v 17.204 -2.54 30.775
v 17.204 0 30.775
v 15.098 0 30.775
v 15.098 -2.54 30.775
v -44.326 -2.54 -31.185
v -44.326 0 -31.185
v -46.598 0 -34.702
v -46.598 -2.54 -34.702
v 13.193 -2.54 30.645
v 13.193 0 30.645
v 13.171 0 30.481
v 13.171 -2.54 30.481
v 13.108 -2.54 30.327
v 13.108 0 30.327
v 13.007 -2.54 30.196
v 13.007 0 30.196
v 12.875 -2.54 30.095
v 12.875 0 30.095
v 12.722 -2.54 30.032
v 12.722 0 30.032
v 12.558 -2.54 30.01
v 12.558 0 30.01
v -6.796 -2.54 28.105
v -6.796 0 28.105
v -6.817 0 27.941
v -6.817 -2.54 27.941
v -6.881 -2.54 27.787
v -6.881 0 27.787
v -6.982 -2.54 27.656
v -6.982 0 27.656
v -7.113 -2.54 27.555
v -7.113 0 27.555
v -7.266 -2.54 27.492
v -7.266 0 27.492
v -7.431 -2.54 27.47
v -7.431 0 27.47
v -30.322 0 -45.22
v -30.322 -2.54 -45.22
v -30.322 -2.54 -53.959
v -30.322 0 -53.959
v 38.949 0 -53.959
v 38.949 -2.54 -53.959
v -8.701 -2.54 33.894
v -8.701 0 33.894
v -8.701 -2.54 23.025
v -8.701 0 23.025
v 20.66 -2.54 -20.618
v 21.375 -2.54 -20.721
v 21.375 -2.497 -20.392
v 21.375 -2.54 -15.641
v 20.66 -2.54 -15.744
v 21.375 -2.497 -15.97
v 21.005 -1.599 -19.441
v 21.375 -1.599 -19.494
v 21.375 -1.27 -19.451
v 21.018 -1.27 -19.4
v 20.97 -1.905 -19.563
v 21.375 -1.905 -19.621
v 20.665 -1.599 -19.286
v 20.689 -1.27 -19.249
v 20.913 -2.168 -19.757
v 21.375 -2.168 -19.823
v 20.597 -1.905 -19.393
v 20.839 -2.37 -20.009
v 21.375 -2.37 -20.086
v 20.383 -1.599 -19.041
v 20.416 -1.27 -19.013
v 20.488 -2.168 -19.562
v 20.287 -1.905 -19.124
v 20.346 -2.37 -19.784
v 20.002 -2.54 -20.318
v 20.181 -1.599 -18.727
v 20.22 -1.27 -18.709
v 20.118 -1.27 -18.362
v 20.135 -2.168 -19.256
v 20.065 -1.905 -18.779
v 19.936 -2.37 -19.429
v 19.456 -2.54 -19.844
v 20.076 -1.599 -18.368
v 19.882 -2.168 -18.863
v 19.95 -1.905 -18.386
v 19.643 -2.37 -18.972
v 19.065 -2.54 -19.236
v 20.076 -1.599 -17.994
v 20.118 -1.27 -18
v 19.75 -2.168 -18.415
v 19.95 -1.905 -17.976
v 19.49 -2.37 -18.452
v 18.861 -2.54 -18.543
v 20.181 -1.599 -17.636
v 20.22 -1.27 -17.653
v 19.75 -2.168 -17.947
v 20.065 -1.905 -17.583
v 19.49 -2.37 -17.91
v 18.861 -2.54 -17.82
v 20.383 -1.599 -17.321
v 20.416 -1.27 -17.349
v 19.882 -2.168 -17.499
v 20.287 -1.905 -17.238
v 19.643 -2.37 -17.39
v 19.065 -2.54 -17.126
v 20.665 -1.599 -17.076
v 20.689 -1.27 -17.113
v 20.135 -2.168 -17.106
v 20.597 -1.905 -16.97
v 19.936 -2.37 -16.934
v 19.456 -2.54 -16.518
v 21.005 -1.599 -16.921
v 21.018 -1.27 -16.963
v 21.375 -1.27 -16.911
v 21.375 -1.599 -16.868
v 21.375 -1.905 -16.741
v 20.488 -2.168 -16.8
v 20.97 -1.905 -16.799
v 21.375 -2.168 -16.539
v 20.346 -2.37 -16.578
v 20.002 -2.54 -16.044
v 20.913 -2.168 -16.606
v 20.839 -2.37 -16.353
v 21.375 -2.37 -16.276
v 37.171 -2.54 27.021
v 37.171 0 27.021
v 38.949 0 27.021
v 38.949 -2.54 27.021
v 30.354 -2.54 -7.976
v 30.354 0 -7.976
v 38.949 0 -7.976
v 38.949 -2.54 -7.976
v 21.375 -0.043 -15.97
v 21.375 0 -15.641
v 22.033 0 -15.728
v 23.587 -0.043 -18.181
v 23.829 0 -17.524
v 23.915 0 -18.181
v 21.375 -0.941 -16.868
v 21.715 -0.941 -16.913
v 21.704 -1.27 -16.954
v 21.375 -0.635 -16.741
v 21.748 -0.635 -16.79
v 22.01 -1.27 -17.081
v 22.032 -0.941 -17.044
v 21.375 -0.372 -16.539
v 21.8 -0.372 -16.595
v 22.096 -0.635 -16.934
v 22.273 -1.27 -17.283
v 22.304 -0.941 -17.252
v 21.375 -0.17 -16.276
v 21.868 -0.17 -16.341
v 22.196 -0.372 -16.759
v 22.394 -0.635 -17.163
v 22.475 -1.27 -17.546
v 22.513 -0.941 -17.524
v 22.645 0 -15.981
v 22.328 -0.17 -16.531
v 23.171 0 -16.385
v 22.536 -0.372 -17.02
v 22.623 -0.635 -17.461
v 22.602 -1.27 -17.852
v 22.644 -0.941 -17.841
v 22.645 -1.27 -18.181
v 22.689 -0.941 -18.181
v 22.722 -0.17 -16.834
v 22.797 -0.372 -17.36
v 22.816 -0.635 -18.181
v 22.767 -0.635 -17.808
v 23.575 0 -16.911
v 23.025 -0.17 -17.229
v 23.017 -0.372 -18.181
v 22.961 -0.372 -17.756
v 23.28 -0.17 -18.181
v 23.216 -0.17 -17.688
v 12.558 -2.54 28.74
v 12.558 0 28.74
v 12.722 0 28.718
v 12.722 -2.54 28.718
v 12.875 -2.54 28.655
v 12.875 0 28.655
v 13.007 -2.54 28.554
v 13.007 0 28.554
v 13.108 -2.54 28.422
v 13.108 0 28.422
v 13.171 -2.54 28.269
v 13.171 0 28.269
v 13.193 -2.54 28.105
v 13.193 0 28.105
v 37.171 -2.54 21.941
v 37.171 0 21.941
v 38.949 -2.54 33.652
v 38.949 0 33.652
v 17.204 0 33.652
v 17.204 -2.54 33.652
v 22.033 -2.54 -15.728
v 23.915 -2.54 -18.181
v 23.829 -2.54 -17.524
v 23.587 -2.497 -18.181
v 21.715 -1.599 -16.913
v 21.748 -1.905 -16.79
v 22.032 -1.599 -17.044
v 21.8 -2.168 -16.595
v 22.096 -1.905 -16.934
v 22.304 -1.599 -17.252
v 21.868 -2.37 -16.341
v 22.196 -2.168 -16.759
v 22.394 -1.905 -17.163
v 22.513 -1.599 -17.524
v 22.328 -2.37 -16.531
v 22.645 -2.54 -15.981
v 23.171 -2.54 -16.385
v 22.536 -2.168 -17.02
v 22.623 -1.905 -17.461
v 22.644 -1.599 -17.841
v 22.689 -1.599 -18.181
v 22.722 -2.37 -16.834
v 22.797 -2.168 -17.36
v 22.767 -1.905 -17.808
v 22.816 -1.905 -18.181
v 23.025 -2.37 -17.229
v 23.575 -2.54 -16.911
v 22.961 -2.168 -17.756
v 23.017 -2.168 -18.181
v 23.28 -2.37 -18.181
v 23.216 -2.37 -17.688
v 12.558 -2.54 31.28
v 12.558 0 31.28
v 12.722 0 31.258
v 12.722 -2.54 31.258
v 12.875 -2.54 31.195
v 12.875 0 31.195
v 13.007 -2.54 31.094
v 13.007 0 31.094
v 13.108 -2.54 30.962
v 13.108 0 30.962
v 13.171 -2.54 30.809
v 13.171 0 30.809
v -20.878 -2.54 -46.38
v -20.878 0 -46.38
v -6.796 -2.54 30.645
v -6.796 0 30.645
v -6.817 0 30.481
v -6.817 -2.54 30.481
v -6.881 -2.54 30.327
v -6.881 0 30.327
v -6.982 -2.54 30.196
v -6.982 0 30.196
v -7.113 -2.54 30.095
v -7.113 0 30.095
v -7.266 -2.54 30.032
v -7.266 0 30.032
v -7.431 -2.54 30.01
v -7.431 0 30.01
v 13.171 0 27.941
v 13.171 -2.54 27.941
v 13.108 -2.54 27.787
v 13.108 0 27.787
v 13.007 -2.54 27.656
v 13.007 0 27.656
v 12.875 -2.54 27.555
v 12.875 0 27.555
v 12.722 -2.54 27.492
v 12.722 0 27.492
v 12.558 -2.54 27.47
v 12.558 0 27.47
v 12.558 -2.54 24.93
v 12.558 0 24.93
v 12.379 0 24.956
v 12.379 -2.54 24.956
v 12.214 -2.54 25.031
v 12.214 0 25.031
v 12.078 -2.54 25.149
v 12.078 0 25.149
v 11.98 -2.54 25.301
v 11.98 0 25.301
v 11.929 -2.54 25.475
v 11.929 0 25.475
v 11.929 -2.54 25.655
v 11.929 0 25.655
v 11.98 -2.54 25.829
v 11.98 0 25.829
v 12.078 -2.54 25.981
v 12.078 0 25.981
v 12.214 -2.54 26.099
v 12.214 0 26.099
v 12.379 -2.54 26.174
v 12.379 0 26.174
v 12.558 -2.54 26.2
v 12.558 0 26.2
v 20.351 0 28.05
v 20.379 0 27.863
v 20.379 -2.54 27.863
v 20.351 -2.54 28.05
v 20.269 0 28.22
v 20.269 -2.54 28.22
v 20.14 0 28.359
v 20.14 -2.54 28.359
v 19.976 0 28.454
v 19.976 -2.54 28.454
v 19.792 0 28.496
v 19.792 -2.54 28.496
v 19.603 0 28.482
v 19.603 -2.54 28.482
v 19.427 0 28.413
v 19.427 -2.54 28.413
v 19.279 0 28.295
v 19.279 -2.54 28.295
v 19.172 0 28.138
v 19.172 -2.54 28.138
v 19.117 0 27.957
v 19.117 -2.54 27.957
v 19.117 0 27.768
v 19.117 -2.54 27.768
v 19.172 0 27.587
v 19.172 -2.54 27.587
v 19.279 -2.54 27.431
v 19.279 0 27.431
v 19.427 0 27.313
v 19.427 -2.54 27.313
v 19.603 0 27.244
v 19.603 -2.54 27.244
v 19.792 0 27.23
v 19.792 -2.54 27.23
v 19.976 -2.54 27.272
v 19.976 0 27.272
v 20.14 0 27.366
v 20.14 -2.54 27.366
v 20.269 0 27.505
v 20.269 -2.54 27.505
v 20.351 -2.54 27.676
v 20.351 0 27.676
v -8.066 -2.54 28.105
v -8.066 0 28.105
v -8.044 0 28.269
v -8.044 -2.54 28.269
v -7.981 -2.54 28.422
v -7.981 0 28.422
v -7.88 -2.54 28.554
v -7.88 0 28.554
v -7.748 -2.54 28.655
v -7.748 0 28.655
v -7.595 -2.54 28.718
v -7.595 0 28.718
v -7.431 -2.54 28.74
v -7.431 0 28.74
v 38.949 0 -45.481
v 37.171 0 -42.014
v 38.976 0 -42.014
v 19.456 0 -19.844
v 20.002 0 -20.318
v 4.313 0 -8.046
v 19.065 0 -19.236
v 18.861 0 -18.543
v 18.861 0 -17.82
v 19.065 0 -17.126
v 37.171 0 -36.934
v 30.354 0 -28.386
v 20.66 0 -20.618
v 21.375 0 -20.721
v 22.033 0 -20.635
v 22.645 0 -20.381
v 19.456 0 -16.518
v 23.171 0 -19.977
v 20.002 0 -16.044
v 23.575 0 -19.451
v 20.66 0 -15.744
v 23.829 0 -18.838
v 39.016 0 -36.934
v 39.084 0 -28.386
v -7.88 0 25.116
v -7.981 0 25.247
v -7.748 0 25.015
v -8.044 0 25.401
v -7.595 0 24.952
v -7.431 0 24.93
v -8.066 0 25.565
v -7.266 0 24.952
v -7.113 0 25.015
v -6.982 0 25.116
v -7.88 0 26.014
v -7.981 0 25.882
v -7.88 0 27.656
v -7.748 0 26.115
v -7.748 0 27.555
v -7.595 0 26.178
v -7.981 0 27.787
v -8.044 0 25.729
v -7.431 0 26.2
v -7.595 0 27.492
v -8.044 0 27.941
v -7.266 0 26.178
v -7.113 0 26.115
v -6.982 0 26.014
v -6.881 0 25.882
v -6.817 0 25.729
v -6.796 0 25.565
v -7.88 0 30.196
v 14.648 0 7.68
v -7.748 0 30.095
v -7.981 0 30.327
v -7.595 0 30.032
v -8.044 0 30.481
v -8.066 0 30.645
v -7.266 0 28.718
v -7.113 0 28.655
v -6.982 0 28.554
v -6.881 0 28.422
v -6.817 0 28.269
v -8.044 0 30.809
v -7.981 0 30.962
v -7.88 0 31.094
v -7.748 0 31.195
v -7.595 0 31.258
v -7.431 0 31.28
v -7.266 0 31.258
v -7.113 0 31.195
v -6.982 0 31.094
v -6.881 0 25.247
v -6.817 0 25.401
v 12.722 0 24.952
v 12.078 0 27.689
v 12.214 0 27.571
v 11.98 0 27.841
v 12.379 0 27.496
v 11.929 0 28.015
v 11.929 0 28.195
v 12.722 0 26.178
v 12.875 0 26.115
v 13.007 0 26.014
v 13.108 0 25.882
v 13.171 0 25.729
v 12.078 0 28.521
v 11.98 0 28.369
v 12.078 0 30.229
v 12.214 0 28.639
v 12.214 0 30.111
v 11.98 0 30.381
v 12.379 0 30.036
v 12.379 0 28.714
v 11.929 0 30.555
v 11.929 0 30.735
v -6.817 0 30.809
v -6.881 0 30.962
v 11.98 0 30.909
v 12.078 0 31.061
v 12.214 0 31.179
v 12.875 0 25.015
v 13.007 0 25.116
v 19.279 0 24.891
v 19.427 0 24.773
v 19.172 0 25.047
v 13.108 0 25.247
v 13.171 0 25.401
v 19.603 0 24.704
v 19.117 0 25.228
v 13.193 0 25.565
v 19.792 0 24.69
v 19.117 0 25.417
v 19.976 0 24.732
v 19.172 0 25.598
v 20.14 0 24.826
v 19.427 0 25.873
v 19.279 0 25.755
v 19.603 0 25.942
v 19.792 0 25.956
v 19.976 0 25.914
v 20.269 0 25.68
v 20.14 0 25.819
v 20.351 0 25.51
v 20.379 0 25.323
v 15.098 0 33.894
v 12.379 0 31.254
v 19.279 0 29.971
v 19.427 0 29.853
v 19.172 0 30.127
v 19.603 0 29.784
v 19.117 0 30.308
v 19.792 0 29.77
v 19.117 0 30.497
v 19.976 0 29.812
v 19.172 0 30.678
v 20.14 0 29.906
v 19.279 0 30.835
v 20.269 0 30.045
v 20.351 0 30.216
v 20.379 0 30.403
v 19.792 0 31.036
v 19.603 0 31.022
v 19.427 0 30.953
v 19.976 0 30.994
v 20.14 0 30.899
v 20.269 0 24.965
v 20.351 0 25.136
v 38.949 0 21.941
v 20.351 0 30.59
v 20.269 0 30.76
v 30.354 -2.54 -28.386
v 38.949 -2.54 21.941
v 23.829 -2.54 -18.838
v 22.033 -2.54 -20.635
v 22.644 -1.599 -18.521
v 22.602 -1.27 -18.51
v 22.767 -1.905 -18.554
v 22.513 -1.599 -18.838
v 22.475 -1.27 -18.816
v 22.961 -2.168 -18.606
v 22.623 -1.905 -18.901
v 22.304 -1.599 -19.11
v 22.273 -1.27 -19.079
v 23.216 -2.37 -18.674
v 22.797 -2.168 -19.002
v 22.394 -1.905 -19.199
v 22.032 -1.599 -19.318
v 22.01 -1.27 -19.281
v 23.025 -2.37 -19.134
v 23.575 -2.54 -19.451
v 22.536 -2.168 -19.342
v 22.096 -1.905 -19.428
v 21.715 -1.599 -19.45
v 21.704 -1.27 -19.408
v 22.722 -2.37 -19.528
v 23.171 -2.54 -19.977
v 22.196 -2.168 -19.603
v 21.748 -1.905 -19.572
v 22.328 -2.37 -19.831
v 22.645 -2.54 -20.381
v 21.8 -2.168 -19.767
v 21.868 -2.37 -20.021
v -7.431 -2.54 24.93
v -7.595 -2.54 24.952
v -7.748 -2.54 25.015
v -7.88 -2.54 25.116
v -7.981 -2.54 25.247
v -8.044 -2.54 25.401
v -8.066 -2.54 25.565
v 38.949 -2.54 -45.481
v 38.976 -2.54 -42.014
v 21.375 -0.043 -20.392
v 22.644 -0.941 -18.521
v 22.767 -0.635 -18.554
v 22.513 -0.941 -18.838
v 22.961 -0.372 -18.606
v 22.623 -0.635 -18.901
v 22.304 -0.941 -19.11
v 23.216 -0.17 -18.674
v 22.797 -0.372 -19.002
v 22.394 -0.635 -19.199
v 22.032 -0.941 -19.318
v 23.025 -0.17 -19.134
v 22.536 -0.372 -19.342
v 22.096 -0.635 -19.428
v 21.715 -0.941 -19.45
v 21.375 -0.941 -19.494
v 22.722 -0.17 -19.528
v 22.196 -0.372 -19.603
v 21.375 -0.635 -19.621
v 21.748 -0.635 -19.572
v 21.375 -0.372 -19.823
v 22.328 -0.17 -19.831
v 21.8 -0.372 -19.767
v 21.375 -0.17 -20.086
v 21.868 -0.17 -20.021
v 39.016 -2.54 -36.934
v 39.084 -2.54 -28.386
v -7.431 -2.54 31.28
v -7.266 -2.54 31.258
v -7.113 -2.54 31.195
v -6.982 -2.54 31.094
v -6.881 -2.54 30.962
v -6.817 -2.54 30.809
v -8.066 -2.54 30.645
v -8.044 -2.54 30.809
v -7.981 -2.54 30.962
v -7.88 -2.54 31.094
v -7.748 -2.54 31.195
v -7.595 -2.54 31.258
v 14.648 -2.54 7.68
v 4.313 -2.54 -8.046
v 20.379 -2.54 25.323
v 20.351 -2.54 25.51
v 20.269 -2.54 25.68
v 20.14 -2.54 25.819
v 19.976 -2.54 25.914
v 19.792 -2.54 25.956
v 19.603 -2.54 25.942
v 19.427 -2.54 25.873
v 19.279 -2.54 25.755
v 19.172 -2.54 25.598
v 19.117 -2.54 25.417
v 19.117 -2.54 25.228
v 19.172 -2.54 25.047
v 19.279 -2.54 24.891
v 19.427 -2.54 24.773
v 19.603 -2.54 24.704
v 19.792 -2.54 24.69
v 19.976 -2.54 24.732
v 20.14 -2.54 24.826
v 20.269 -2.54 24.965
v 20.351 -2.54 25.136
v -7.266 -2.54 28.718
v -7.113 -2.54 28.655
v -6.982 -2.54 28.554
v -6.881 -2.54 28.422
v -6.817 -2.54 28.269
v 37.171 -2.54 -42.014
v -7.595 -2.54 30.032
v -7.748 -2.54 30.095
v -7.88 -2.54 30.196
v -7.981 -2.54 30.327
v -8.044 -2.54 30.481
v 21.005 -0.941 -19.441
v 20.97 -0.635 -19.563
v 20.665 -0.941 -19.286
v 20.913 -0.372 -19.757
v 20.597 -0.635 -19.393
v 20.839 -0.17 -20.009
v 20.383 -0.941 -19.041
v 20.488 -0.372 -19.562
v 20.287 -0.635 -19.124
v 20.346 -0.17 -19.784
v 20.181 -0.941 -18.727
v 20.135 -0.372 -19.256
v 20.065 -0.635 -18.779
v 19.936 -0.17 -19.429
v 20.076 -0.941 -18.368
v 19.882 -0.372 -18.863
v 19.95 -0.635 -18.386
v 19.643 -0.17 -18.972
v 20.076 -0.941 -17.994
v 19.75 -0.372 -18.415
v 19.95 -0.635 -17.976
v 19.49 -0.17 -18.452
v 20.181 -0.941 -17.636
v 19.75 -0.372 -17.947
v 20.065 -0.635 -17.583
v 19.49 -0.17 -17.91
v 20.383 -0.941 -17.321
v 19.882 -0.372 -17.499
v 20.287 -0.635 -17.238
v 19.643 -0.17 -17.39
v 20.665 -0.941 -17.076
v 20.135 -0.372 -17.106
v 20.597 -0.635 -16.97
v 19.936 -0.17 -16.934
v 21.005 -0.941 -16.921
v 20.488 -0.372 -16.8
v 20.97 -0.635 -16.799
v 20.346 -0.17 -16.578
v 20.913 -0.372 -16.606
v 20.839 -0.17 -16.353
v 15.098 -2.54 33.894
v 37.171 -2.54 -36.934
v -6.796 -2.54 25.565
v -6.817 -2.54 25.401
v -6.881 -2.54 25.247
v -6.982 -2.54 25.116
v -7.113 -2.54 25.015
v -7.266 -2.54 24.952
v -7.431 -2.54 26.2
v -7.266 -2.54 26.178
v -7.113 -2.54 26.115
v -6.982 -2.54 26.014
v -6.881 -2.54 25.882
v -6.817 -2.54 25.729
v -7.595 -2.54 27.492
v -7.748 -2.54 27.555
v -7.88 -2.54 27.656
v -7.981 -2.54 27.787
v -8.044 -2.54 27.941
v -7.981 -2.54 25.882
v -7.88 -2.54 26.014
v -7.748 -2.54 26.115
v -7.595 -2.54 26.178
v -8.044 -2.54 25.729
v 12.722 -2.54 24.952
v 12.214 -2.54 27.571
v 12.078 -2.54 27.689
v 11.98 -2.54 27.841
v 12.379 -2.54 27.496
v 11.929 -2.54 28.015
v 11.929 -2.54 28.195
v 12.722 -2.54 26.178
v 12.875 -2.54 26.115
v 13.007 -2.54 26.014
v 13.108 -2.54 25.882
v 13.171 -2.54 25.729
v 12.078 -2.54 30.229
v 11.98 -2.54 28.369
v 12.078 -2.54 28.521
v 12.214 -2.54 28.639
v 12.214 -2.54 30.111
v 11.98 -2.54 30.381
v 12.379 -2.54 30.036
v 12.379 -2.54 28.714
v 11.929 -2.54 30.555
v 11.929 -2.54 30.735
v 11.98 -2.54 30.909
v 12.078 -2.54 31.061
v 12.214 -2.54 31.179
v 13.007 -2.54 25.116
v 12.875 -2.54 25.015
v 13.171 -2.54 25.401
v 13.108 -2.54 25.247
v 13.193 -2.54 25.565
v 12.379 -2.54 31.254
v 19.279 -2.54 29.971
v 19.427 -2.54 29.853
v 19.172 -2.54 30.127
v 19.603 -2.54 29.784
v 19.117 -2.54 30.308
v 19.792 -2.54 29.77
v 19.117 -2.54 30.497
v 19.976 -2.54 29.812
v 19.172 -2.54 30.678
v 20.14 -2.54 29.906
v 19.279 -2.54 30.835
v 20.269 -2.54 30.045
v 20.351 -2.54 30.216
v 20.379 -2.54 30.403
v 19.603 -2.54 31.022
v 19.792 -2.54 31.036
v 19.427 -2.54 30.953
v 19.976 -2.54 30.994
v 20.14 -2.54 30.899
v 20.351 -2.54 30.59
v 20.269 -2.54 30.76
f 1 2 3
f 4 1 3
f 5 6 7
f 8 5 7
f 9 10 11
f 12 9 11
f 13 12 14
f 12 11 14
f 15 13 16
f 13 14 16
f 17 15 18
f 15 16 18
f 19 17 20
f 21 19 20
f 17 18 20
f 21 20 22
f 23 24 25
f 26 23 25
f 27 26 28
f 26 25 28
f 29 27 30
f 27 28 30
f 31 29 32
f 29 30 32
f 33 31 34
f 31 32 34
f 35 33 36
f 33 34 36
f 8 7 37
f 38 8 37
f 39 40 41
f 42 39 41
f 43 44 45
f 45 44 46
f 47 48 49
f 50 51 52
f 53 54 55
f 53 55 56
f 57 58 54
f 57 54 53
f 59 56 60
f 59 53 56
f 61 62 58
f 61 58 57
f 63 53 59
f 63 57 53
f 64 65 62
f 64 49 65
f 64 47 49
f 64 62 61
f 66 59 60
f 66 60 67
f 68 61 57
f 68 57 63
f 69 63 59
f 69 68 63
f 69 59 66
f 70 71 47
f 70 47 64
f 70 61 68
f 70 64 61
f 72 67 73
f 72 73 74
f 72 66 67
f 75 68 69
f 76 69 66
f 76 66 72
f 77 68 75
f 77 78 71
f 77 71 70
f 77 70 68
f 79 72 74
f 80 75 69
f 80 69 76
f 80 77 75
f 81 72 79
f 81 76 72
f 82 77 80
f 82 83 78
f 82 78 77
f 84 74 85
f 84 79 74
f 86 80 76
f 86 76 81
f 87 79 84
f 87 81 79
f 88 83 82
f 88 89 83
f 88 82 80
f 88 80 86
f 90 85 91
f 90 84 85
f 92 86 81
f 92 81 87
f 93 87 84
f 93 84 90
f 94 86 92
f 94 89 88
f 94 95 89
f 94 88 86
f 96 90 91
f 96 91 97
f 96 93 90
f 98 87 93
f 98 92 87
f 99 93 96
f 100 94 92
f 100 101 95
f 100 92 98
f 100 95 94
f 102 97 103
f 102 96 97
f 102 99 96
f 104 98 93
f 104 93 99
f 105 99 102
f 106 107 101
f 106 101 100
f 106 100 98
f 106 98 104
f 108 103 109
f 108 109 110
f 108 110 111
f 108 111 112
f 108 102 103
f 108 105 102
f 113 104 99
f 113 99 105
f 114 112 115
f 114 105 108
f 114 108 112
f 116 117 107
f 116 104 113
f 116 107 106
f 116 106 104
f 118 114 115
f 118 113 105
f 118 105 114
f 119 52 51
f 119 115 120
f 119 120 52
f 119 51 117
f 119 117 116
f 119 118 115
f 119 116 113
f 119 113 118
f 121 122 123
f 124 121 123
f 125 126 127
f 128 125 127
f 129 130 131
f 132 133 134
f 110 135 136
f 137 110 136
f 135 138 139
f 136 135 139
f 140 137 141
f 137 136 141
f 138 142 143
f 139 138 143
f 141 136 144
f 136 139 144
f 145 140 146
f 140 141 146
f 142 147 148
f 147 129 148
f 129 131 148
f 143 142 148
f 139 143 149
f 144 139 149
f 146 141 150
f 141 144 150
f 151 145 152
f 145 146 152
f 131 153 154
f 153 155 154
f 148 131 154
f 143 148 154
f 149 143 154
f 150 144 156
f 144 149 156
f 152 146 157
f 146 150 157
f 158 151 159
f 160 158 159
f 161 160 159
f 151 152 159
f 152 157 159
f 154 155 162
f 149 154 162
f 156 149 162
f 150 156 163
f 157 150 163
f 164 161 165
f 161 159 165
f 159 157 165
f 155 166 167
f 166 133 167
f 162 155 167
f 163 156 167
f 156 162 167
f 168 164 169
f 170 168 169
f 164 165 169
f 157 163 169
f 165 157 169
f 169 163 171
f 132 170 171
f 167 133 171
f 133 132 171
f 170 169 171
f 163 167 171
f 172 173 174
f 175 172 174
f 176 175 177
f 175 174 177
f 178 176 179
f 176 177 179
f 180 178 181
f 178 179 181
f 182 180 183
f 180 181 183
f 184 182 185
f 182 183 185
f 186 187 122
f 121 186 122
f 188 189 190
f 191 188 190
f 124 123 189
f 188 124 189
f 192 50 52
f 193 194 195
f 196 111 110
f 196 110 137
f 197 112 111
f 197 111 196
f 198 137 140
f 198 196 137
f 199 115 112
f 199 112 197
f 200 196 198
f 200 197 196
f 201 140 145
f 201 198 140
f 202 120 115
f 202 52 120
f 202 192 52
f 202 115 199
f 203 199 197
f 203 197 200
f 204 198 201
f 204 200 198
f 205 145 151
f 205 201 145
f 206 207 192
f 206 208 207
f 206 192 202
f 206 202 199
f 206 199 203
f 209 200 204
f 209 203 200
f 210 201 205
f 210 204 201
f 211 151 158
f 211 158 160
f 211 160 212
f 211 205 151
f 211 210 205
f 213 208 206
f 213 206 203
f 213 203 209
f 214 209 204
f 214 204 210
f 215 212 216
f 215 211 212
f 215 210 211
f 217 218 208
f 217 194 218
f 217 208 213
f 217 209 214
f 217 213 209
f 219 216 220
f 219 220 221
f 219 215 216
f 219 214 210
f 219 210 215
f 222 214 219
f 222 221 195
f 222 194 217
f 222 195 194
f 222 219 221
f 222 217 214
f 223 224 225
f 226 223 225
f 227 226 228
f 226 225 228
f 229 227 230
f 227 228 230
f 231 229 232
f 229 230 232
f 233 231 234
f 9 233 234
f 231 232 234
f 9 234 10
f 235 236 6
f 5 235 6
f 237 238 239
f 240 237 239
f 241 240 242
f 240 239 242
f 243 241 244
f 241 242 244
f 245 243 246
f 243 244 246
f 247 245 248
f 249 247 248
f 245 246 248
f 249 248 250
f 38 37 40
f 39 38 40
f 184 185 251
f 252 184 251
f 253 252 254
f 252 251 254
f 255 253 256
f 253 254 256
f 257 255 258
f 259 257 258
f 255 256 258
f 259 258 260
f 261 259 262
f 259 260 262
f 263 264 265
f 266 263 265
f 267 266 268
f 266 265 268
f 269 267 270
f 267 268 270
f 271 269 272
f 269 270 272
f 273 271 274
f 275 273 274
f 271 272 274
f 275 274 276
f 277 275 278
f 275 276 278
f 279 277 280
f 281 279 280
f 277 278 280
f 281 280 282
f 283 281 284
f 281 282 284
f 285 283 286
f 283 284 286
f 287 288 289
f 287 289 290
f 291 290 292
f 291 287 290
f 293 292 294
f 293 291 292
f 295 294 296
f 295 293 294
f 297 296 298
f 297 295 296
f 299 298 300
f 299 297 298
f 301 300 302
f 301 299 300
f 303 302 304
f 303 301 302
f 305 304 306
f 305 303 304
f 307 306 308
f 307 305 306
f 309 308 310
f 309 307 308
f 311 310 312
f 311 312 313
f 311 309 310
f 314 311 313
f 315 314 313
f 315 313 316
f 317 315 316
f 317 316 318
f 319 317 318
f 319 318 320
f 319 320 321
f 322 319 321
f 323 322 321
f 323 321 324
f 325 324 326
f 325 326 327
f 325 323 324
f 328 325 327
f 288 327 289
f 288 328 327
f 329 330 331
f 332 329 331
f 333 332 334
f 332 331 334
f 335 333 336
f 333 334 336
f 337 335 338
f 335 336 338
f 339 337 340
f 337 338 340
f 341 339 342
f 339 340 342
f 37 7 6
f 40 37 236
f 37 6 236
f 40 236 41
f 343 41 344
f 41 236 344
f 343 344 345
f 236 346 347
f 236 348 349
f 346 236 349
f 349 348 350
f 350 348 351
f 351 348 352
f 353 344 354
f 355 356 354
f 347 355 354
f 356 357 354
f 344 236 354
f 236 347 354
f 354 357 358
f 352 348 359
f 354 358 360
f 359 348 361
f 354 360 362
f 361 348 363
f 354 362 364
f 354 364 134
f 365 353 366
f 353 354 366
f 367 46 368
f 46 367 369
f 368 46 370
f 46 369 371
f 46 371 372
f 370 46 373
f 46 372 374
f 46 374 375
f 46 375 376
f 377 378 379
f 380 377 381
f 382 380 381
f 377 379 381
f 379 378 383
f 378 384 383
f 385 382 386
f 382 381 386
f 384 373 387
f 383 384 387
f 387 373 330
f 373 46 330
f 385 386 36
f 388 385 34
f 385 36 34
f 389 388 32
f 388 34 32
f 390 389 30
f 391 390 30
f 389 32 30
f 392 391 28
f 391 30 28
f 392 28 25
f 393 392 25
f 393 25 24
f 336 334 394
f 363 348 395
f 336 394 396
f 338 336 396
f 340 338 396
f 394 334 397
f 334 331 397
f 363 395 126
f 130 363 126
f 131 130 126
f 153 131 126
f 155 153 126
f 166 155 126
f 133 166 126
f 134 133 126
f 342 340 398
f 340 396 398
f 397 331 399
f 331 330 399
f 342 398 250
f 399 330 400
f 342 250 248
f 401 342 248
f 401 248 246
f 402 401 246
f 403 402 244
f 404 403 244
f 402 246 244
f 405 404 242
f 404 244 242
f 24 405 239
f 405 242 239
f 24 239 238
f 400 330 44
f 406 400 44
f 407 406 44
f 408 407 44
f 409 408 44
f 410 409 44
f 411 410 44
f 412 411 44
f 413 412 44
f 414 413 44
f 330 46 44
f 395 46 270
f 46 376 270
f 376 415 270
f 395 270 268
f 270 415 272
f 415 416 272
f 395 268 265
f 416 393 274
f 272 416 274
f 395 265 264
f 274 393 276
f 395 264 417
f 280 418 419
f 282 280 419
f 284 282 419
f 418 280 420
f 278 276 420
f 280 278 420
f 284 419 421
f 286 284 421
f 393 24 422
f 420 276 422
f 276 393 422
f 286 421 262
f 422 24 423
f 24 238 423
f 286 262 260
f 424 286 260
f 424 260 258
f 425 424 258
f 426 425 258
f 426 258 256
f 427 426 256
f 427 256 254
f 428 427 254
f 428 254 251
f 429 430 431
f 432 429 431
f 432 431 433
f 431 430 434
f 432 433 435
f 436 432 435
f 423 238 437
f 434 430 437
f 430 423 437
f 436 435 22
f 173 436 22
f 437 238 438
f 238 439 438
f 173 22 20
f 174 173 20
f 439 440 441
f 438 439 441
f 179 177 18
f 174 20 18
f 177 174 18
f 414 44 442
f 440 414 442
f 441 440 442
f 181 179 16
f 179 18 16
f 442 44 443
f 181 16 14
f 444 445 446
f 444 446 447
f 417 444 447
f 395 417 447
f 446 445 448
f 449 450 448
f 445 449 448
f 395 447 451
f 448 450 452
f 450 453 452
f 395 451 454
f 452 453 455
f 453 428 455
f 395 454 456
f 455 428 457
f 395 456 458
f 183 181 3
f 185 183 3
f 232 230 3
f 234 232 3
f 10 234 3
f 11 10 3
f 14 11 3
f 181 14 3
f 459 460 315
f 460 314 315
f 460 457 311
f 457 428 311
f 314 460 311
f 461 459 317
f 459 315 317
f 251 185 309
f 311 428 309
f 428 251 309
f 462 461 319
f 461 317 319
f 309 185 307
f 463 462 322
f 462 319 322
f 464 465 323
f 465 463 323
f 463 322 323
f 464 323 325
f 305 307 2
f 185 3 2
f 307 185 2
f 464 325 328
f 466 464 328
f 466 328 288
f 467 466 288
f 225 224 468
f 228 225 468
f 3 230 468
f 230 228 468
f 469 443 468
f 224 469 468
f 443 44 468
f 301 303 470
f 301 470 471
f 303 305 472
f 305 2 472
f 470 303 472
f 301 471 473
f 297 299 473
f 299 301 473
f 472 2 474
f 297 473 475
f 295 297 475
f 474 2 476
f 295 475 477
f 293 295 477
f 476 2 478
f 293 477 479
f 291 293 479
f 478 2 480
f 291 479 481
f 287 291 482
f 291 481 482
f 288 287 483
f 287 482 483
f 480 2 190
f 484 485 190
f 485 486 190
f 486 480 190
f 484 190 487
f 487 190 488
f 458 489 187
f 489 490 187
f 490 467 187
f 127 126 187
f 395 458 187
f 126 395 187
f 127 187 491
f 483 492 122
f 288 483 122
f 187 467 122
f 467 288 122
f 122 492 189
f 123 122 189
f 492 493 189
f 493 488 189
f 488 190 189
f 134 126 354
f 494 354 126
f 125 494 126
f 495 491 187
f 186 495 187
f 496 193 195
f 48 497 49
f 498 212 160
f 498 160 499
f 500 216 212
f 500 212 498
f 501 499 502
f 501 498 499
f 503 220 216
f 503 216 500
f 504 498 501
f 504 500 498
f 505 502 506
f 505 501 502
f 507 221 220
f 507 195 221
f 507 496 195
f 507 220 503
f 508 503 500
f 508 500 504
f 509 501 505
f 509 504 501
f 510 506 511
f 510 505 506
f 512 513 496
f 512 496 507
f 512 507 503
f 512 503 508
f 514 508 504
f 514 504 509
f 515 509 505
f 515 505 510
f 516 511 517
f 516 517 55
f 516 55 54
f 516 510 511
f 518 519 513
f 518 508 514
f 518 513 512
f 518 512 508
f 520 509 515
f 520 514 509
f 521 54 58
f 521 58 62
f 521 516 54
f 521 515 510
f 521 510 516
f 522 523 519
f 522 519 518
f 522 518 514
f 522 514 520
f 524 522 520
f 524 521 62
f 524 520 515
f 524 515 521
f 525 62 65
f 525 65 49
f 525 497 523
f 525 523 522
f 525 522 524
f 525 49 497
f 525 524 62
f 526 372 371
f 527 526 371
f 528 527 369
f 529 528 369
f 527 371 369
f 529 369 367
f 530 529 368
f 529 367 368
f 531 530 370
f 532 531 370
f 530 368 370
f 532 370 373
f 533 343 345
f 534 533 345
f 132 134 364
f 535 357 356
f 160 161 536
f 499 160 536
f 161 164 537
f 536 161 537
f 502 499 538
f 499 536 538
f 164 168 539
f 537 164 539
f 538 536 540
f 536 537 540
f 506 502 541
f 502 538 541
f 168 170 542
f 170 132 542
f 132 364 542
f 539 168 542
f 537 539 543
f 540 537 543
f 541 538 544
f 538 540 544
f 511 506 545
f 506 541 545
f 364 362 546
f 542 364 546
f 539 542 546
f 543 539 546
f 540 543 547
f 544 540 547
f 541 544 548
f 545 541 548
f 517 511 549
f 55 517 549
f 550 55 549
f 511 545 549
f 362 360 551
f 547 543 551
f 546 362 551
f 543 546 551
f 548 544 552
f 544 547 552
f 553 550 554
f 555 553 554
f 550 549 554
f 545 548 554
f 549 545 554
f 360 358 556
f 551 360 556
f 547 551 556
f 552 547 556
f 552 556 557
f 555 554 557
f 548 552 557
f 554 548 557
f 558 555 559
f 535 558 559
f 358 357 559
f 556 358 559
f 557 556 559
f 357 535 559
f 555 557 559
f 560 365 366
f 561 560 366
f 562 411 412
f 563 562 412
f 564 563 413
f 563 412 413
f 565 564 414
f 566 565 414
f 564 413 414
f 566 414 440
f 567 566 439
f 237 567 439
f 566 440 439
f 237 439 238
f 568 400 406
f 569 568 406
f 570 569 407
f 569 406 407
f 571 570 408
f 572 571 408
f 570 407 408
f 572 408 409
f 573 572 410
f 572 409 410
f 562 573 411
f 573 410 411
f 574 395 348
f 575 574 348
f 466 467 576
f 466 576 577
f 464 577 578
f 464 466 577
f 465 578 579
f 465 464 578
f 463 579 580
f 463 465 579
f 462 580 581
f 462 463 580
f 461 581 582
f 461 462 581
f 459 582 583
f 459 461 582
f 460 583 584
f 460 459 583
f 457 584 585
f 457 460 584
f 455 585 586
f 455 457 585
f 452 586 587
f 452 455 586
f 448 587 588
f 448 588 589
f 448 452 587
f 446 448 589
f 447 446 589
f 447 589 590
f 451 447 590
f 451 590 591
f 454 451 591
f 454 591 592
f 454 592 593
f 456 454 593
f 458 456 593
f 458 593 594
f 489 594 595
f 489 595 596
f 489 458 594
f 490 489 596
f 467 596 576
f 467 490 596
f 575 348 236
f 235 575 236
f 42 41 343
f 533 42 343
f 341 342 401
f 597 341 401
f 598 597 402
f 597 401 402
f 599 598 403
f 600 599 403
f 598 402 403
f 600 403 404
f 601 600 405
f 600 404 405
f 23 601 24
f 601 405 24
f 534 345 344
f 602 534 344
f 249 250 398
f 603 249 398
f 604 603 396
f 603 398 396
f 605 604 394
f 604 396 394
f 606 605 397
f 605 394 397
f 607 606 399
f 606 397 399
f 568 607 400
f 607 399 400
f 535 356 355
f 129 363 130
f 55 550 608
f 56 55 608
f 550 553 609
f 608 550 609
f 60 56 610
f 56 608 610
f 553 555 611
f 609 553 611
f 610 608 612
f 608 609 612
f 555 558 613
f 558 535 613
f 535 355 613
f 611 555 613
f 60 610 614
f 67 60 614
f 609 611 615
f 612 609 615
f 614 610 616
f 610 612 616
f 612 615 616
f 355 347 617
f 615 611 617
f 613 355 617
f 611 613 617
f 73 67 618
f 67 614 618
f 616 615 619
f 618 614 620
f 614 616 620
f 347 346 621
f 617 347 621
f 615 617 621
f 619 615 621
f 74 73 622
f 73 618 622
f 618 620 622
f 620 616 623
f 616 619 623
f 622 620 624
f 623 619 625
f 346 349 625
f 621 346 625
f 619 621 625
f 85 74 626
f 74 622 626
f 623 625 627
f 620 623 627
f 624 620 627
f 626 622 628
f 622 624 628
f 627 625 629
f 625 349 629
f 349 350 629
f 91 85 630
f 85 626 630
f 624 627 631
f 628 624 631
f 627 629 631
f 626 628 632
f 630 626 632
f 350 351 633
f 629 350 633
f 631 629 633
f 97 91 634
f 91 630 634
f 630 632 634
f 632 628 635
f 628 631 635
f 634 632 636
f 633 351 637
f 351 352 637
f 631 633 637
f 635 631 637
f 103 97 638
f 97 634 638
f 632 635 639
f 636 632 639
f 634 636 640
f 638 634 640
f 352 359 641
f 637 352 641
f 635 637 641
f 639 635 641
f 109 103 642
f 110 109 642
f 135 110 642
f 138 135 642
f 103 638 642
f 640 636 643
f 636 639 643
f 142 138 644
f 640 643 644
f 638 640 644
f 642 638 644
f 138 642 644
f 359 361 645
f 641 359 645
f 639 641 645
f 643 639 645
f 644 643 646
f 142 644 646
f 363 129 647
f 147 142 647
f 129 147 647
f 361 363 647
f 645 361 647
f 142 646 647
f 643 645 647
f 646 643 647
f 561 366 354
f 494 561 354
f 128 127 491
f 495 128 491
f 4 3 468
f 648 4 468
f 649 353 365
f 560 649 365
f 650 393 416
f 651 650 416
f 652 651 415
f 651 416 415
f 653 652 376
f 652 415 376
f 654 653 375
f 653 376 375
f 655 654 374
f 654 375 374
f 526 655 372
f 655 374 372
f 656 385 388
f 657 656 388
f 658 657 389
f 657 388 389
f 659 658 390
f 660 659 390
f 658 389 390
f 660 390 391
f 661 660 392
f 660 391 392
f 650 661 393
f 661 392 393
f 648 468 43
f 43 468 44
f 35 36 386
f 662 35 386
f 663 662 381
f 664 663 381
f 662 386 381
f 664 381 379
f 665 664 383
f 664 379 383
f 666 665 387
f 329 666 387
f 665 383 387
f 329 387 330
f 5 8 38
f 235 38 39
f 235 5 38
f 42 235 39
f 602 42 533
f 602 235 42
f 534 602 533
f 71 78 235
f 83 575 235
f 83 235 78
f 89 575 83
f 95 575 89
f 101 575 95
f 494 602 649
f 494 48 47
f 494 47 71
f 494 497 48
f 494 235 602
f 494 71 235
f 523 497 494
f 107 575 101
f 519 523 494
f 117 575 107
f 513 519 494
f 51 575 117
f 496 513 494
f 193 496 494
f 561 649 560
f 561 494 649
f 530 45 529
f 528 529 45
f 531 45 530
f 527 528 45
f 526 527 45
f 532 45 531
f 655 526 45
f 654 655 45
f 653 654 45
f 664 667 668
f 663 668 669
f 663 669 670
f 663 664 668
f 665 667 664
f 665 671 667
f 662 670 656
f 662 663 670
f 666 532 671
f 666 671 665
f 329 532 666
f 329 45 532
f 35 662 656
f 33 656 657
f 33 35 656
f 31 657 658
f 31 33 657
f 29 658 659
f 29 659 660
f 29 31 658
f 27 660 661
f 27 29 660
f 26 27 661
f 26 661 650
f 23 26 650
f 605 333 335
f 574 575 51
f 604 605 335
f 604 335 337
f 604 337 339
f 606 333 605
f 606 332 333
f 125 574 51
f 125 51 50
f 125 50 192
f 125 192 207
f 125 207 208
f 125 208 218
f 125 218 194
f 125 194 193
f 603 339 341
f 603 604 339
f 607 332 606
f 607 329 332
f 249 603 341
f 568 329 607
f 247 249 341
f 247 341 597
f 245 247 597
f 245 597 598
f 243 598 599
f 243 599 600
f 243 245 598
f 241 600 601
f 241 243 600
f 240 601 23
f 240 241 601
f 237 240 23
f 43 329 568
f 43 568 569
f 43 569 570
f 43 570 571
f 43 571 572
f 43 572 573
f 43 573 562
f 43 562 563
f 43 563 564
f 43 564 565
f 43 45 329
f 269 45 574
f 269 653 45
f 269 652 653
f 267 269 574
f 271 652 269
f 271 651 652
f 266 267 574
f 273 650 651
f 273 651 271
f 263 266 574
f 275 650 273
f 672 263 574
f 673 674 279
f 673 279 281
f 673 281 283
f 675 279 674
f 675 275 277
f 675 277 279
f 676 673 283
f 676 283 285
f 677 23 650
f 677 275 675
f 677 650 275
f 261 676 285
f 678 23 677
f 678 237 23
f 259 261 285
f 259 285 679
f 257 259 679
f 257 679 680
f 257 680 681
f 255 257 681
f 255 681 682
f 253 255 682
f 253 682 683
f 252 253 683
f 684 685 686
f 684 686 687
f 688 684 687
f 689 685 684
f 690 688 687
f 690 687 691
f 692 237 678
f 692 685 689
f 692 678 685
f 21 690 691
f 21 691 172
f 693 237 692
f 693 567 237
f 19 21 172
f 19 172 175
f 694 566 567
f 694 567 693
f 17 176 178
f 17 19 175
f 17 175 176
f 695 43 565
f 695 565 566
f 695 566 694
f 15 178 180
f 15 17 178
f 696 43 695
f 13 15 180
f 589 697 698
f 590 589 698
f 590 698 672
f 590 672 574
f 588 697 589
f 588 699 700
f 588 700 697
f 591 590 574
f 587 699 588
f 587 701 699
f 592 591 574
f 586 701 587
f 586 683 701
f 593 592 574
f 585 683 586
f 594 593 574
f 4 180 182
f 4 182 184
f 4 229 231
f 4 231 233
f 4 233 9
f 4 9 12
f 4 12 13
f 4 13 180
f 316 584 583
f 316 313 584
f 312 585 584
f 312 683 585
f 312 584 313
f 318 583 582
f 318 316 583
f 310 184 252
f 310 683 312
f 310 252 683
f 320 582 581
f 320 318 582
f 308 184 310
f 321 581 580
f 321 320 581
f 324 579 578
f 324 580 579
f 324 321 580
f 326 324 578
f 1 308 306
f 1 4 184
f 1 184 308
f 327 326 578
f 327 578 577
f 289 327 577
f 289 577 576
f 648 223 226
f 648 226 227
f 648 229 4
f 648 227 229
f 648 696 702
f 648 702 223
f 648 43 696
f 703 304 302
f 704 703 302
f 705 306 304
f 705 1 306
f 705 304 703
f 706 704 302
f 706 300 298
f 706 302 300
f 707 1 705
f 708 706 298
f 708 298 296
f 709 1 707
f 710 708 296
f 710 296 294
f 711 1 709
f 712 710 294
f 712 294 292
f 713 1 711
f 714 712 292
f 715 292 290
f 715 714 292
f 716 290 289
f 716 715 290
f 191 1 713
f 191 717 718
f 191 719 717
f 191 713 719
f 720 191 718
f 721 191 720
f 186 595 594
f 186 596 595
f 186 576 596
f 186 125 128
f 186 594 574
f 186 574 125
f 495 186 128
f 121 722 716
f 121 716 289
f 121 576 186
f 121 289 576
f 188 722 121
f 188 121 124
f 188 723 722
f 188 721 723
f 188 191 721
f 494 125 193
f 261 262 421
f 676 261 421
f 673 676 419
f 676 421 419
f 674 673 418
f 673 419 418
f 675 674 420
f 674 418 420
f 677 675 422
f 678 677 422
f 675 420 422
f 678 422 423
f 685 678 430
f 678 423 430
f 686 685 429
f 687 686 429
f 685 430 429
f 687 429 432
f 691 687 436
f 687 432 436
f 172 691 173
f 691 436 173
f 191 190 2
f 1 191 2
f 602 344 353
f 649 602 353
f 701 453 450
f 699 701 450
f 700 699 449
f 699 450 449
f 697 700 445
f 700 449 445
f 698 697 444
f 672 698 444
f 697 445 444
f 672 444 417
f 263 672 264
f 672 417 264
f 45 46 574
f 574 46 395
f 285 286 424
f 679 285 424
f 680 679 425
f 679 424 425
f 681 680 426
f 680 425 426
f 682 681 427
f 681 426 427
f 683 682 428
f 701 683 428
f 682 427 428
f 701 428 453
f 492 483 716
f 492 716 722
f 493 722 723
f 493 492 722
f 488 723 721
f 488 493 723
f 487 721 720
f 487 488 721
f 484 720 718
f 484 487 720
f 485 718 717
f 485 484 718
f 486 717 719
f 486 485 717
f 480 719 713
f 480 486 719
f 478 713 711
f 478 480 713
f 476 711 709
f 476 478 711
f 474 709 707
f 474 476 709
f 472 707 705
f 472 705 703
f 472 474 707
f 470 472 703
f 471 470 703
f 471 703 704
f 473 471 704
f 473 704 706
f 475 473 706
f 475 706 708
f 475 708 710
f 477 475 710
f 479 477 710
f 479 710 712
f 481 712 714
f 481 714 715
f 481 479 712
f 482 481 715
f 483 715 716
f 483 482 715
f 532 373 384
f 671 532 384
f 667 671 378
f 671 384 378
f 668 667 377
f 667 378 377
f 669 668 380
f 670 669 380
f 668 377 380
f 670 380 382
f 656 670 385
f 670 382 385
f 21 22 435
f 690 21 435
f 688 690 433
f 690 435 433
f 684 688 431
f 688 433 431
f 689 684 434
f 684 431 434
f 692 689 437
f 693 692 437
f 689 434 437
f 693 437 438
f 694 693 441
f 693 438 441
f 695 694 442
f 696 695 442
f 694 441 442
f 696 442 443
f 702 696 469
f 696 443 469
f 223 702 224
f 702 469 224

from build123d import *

# Parameters (mm, degrees)
F0_R     = 0.635
F1_DEPTH = 2.54
F2_R     = 1.26999


# Not quite as in the source:
# - a fillet or chamfer is up to 0.001 mm smaller than in the source, because OpenCascade refuses the exact size


with BuildPart() as f1:
    # F0 (on Front) → F1 (new body)
    with BuildSketch(Plane.XZ):
        Polygon((15.0977487051, 33.894000689), (-8.7011743405, 33.894000689), (-8.7011743405, 30.6449289119), (-8.7011743405, 30.6394077664), (-8.7011743405, 28.5887729555), (-8.7011743405, 28.1049289119), (-8.7011743405, 23.0249289119), (21.375445649, 23.0249289119), (37.1712256595, 23.0249289119), (37.1712256595, 27.0205680281), (38.9492256595, 27.0205680281), (38.9492256595, 30.7752811804), (38.9492256595, 33.6518122062), (17.204430995, 33.6518122062), (17.204430995, 30.7752811804), (15.0977487051, 30.7752811804), align=None)
        with BuildLine():
            ThreePointArc((-6.7956986329, 25.5649289119), (-6.9816858268, 25.1159161058), (-7.4306986329, 24.9299289119))
            ThreePointArc((-7.4306986329, 24.9299289119), (-7.8797114389, 25.1159161058), (-8.0656986329, 25.5649289119))
            ThreePointArc((-8.0656986329, 25.5649289119), (-7.8797114389, 26.0139417179), (-7.4306986329, 26.1999289119))
            ThreePointArc((-7.4306986329, 26.1999289119), (-6.9816858268, 26.0139417179), (-6.7956986329, 25.5649289119))
        make_face(mode=Mode.SUBTRACT)
        with BuildLine():
            ThreePointArc((-7.4306986329, 28.7399289119), (-6.9816858268, 28.5539417179), (-6.7956986329, 28.1049289119))
            ThreePointArc((-6.7956986329, 28.1049289119), (-6.9816858268, 27.6559161058), (-7.4306986329, 27.4699289119))
            ThreePointArc((-7.4306986329, 27.4699289119), (-7.8797114389, 27.6559161058), (-8.0656986329, 28.1049289119))
            ThreePointArc((-8.0656986329, 28.1049289119), (-7.8797114389, 28.5539417179), (-7.4306986329, 28.7399289119))
        make_face(mode=Mode.SUBTRACT)
        with BuildLine():
            ThreePointArc((-7.4306986329, 30.0099289119), (-7.8797114389, 30.1959161058), (-8.0656986329, 30.6449289119))
            ThreePointArc((-8.0656986329, 30.6449289119), (-7.8797114389, 31.0939417179), (-7.4306986329, 31.2799289119))
            ThreePointArc((-7.4306986329, 31.2799289119), (-6.9816858268, 31.0939417179), (-6.7956986329, 30.6449289119))
            ThreePointArc((-6.7956986329, 30.6449289119), (-6.9816858268, 30.1959161058), (-7.4306986329, 30.0099289119))
        make_face(mode=Mode.SUBTRACT)
        with BuildLine():
            ThreePointArc((13.1927487051, 25.5649289119), (13.0067615112, 25.1159161058), (12.5577487051, 24.9299289119))
            ThreePointArc((12.5577487051, 24.9299289119), (11.9227487051, 25.5649289119), (12.5577487051, 26.1999289119))
            ThreePointArc((12.5577487051, 26.1999289119), (13.0067615112, 26.0139417179), (13.1927487051, 25.5649289119))
        make_face(mode=Mode.SUBTRACT)
        with BuildLine():
            ThreePointArc((12.5577487051, 28.7399289119), (13.0067615112, 28.5539417179), (13.1927487051, 28.1049289119))
            ThreePointArc((13.1927487051, 28.1049289119), (13.0067615112, 27.6559161058), (12.5577487051, 27.4699289119))
            ThreePointArc((12.5577487051, 27.4699289119), (11.9227487051, 28.1049289119), (12.5577487051, 28.7399289119))
        make_face(mode=Mode.SUBTRACT)
        with BuildLine():
            ThreePointArc((13.1927487051, 30.6449289119), (13.0067615112, 30.1959161058), (12.5577487051, 30.0099289119))
            ThreePointArc((12.5577487051, 30.0099289119), (11.9227487051, 30.6449289119), (12.5577487051, 31.2799289119))
            ThreePointArc((12.5577487051, 31.2799289119), (13.0067615112, 31.0939417179), (13.1927487051, 30.6449289119))
        make_face(mode=Mode.SUBTRACT)
        with Locations((19.744430995, 25.3227458062)):
            Circle(F0_R, mode=Mode.SUBTRACT)
        with Locations((19.744430995, 27.8627458062)):
            Circle(F0_R, mode=Mode.SUBTRACT)
        with Locations((19.744430995, 30.4027458062)):
            Circle(F0_R, mode=Mode.SUBTRACT)
        with BuildLine():
            Line((21.375445649, 23.0249289119), (-8.7011743405, 23.0249289119))
            Line((-8.7011743405, 23.0249289119), (14.6481524707, 7.6804661495))
            Line((14.6481524707, 7.6804661495), (4.3133735196, -8.0457365195))
            Line((4.3133735196, -8.0457365195), (4.3133735196, -53.9590548808))
            Line((4.3133735196, -53.9590548808), (21.375445649, -53.9590548808))
            Line((21.375445649, -53.9590548808), (21.375445649, -19.4510648049))
            ThreePointArc((21.375445649, -19.4510648049), (20.105445649, -18.1810648049), (21.375445649, -16.9110648049))
            Line((21.375445649, -16.9110648049), (21.375445649, 23.0249289119))
        make_face()
        with BuildLine():
            Line((37.1712256595, 23.0249289119), (21.375445649, 23.0249289119))
            Line((21.375445649, 23.0249289119), (21.375445649, -16.9110648049))
            ThreePointArc((21.375445649, -16.9110648049), (22.2734712611, -17.2830391928), (22.645445649, -18.1810648049))
            Line((22.645445649, -18.1810648049), (30.3538220114, -18.1810648049))
            Line((30.3538220114, -18.1810648049), (30.3538220114, -7.9758184713))
            Line((30.3538220114, -7.9758184713), (38.9492256595, -7.9758184713))
            Line((38.9492256595, -7.9758184713), (38.9492256595, 5.319000689))
            Line((38.9492256595, 5.319000689), (38.9492256595, 21.9405680281))
            Line((38.9492256595, 21.9405680281), (37.1712256595, 21.9405680281))
            Line((37.1712256595, 21.9405680281), (37.1712256595, 23.0249289119))
        make_face()
        Polygon((4.3133735196, -53.9590548808), (4.3133735196, -8.0457365195), (-20.8784960799, -46.3796427219), (-44.3256125721, -31.185070223), (-46.598433602, -34.7022139158), (-30.3224786203, -45.2199339734), (-30.3224786203, -53.9590548808), align=None)
        with BuildLine():
            Line((30.3538220114, -18.1810648049), (22.645445649, -18.1810648049))
            ThreePointArc((22.645445649, -18.1810648049), (22.2734712611, -19.079090417), (21.375445649, -19.4510648049))
            Line((21.375445649, -19.4510648049), (21.375445649, -53.9590548808))
            Line((21.375445649, -53.9590548808), (38.9492256595, -53.9590548808))
            Line((38.9492256595, -53.9590548808), (38.9492256595, -45.480999311))
            Line((38.9492256595, -45.480999311), (38.9492256595, -42.0136552247))
            Line((38.9492256595, -42.0136552247), (37.1712256595, -42.0136552247))
            Line((37.1712256595, -42.0136552247), (37.1712256595, -36.9336552247))
            Line((37.1712256595, -36.9336552247), (38.9492256595, -36.9336552247))
            Line((38.9492256595, -36.9336552247), (38.9492256595, -28.3863111384))
            Line((38.9492256595, -28.3863111384), (30.3538220114, -28.3863111384))
            Line((30.3538220114, -28.3863111384), (30.3538220114, -18.1810648049))
        make_face()
        Polygon((38.9492256595, -42.0136552247), (38.9492256595, -45.480999311), (38.9764610146, -42.0136552247), align=None)
        Polygon((39.0835013158, -28.3863111384), (38.9492256595, -28.3863111384), (38.9492256595, -36.9336552247), (39.0163634877, -36.9336552247), align=None)
    extrude(amount=F1_DEPTH)

    # F2 (radius 1.27 in the source; OpenCascade refuses exactly that, so slightly less here)
    f2_edges = [f1.edges().sort_by_distance(p)[0] for p in [
        (20.105446, -2.54, -18.181065),
        (20.105446, 0, -18.181065),
    ]]
    fillet(f2_edges, radius=F2_R)


solid = f1.part
